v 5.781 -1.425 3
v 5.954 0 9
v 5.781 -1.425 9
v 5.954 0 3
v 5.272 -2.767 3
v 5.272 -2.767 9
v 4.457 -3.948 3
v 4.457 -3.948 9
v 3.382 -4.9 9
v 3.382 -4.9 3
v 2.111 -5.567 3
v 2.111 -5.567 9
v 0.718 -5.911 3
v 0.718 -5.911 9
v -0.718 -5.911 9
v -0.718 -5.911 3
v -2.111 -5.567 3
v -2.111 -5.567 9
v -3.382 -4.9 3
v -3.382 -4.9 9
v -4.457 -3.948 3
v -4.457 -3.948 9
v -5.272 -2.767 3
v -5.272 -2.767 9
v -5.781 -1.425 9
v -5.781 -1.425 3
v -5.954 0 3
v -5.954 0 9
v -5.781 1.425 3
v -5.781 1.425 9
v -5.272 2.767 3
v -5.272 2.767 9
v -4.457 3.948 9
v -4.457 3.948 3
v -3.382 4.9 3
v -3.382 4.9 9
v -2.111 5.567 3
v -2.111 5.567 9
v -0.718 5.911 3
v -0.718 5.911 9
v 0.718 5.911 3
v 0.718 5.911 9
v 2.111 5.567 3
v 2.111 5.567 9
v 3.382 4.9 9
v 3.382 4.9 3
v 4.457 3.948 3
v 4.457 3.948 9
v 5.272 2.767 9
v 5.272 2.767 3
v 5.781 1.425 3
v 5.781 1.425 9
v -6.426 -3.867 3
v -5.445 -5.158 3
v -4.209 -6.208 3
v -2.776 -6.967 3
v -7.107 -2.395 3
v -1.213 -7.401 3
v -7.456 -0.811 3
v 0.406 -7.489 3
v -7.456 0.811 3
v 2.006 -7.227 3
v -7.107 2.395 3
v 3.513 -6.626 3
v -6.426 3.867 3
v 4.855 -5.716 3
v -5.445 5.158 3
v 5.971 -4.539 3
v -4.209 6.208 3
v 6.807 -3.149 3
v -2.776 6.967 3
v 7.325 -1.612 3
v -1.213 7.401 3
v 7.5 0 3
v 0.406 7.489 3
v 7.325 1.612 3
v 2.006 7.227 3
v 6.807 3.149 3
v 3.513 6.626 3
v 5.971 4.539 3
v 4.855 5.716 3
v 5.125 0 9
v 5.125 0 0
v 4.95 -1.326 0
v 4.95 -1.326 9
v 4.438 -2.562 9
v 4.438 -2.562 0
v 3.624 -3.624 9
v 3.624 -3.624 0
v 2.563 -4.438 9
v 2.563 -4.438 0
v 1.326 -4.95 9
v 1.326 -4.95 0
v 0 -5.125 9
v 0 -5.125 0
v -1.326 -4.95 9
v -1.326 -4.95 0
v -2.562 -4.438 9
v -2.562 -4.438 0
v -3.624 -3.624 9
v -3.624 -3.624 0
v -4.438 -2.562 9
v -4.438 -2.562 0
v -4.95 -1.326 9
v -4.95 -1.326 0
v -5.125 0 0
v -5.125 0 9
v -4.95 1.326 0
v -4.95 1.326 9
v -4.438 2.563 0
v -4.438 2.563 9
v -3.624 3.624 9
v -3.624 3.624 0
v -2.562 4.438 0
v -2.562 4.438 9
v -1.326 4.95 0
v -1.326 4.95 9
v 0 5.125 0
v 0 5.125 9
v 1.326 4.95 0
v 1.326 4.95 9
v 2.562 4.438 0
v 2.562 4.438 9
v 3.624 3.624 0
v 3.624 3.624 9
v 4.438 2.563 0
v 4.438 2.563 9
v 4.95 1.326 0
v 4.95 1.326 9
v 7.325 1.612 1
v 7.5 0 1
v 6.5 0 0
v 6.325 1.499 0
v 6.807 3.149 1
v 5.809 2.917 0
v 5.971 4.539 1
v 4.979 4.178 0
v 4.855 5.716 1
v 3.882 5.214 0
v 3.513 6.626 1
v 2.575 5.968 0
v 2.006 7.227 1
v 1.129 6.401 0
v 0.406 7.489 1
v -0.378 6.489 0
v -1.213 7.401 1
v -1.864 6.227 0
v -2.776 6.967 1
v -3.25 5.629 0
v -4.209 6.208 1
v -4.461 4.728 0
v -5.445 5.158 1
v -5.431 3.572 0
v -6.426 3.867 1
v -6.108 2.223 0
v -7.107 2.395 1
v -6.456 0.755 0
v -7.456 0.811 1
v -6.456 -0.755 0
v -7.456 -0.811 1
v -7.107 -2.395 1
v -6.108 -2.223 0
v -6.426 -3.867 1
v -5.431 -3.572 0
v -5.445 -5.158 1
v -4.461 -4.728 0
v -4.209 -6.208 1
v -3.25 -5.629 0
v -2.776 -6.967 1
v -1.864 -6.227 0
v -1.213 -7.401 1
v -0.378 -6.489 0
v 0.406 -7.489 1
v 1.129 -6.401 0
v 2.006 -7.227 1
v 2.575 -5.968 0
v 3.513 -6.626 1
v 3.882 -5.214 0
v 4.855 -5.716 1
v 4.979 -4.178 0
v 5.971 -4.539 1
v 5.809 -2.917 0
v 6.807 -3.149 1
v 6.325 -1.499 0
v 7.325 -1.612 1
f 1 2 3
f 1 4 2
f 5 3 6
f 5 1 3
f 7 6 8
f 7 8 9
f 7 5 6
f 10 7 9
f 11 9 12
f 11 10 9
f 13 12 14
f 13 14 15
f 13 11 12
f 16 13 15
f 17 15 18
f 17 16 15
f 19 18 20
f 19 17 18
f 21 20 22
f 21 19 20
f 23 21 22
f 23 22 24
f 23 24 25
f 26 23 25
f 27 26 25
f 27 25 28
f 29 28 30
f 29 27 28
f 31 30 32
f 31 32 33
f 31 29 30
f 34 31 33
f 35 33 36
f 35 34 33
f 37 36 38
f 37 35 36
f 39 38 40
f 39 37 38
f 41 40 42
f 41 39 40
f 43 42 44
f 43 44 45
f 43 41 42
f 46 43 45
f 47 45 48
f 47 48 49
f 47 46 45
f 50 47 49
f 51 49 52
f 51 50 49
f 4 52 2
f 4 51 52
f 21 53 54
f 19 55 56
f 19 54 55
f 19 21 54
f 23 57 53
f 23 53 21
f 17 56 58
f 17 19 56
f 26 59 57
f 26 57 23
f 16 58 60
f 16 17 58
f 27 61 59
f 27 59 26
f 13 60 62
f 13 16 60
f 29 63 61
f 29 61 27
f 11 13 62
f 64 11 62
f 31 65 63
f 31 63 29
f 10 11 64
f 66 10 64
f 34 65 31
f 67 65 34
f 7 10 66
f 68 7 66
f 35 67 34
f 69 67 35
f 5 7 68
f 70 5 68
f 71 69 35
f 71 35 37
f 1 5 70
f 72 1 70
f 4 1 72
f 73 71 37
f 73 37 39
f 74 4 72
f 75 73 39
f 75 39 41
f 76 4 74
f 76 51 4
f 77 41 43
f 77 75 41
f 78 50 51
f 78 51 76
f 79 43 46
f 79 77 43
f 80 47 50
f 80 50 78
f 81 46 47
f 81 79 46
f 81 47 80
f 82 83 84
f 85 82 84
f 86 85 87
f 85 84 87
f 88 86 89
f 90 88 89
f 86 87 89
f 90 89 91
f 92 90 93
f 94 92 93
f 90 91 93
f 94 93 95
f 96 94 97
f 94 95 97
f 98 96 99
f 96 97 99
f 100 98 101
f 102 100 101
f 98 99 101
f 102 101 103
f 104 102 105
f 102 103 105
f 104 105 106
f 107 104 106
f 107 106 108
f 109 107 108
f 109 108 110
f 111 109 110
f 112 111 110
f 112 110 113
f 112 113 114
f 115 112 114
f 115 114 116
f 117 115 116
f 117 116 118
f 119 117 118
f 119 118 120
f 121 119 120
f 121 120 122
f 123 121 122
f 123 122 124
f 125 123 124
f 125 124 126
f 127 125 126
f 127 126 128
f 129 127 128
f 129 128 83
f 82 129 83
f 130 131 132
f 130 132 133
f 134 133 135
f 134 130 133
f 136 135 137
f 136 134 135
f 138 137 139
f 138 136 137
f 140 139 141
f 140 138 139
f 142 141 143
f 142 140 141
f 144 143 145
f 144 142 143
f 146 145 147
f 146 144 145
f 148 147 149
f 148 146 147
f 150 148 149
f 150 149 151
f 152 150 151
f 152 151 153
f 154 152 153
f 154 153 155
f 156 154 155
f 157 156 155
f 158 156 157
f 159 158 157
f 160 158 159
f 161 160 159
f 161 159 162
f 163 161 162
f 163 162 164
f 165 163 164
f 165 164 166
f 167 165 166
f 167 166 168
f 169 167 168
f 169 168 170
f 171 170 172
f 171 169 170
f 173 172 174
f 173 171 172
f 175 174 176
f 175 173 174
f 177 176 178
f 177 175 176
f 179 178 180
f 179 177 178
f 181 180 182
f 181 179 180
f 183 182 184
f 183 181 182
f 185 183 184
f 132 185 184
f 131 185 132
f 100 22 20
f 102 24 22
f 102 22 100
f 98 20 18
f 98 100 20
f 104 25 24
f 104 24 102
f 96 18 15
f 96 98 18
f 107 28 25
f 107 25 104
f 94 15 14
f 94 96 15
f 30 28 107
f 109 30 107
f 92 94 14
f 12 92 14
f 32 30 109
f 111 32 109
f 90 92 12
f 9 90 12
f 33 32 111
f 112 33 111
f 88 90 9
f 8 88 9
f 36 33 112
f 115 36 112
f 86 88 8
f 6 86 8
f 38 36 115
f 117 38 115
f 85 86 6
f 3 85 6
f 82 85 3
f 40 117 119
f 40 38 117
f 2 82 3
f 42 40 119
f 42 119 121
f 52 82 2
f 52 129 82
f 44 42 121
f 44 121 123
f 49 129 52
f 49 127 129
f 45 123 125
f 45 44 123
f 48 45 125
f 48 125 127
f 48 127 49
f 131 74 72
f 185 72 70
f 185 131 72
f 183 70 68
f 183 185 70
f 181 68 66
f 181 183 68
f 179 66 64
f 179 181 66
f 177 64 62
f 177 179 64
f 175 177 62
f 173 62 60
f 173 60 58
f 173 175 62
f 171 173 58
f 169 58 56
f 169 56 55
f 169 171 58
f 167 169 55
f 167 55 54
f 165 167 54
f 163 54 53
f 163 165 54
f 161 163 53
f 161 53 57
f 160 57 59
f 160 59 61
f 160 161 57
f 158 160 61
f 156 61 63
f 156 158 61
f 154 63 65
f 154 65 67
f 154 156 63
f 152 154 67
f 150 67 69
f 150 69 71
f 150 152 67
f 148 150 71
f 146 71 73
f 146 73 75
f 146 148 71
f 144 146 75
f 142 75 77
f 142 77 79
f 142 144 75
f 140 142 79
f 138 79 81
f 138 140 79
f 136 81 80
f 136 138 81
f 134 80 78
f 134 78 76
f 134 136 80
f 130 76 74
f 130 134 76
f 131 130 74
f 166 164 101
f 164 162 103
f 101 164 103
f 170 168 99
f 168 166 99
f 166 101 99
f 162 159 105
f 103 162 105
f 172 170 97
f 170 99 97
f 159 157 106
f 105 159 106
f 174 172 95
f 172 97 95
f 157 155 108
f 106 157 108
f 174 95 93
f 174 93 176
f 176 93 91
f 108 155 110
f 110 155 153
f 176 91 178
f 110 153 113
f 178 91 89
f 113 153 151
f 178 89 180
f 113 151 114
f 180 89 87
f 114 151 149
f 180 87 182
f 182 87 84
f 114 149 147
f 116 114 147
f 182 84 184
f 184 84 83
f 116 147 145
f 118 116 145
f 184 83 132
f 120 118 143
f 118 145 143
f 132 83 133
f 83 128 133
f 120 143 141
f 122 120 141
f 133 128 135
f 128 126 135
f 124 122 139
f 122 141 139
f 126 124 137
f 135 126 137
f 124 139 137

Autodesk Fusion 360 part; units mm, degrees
sketch "Sketch1" plane through (0, 0, 0) normal (0, 0, 1) x (1, 0, 0)
  circle A0 centre (0, 0) radius 5.125
  circle A1 centre (0, 0) radius 6
  circle A2 centre (0, 0) radius 7.5
  dimension "d1" = 10.25
  dimension "d2" = 12
  dimension "d3" = 15
extrude "Extrude1" add sketch "Sketch1" along normal blind 3 contours A2
extrude "Extrude2" add sketch "Sketch1" along normal blind 9 contours A1
chamfer "Chamfer1" distance 1 angle 45 1 edges at (-6.9925, -2.7121, 0)
thread "Thread1" "ISO Metric profile 12.0 M12x0.75 M12x0.75 6g" major diameter 11.908 minor diameter 11.0445 pitch 0.75 angle 60 resizes the face on face at (5.9702, -0.5974, 5)
